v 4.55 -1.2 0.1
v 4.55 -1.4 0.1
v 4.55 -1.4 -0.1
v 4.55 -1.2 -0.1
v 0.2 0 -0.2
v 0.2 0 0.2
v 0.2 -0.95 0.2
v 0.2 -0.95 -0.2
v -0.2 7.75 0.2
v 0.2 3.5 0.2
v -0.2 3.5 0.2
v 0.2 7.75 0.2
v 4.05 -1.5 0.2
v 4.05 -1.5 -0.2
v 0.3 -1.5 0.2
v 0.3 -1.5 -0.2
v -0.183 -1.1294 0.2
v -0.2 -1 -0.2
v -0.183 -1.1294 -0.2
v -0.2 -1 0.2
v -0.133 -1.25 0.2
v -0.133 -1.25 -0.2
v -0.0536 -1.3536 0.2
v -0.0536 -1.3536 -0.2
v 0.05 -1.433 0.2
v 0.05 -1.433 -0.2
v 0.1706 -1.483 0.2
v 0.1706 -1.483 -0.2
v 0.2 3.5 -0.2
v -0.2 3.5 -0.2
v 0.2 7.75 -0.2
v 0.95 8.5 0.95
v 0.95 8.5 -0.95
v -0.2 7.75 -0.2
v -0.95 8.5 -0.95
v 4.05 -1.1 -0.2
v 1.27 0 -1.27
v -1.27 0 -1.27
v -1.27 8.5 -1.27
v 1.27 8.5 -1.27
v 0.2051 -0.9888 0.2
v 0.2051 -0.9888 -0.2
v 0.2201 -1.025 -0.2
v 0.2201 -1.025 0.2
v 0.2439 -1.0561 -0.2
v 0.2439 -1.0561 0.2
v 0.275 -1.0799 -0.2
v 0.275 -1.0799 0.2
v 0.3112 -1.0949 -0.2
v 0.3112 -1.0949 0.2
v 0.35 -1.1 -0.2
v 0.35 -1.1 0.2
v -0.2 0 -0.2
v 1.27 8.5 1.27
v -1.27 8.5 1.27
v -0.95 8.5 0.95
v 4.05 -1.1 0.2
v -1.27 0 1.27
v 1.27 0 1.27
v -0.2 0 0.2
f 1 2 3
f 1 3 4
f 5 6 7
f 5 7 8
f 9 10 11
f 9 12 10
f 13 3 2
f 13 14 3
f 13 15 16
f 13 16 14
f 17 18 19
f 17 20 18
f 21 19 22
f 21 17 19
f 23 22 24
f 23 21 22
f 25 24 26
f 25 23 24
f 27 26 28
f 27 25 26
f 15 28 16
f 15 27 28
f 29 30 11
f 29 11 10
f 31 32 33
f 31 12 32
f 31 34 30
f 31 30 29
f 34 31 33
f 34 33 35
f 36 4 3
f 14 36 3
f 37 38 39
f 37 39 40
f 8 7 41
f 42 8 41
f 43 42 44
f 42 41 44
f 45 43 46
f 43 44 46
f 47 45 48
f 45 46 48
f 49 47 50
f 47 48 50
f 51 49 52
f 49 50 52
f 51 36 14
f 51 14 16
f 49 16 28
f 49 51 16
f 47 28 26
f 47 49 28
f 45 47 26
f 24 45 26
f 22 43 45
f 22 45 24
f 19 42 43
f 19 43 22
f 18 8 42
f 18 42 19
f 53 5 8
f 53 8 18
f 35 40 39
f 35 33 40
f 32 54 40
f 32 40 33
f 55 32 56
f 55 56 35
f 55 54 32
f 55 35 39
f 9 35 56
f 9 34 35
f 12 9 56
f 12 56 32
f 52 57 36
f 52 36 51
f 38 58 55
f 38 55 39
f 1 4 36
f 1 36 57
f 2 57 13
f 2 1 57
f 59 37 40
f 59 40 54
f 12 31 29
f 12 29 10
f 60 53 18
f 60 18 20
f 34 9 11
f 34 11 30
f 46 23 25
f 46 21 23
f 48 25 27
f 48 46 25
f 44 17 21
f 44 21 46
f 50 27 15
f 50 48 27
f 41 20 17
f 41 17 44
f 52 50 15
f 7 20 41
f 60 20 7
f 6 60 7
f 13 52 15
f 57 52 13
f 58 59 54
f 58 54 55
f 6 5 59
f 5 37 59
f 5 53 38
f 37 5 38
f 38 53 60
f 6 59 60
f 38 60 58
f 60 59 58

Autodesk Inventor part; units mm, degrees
ref_plane "YZ Plane" through (0, 0, 0) normal (1, 0, 0) x (0, 1, 0)
ref_plane "XZ Plane" through (0, 0, 0) normal (0, 1, 0) x (-1, 0, 0)
ref_plane "XY Plane" through (0, 0, 0) normal (0, 0, 1) x (1, 0, 0)
sketch "Sketch1" plane through (0, 0, 0) normal (0, 1, 0) x (-1, 0, 0)
  line L0 (-1.27, 1.27) -> (1.27, 1.27)
  line L1 (1.27, 1.27) -> (1.27, -1.27)
  line L2 (1.27, -1.27) -> (-1.27, -1.27)
  line L3 (-1.27, -1.27) -> (-1.27, 1.27)
  line L4 (-1.27, 1.27) -> (1.27, -1.27) construction
  line L5 (1.27, 1.27) -> (-1.27, -1.27) construction
  point P0 (0, 0)
  dimension "d0" = 2.54
  dimension "d1" = 2.54
extrude "Extrusion1" add sketch "Sketch1" along normal blind 8.5
sketch "Sketch2" plane through (0, 8.5, 0) normal (0, 1, 0) x (1, 0, 0)
  line L0 (0.2, -0.2) -> (-0.2, -0.2)
  line L1 (-0.2, -0.2) -> (-0.2, 0.2)
  line L2 (-0.2, 0.2) -> (0.2, 0.2)
  line L3 (0.2, 0.2) -> (0.2, -0.2)
  line L4 (0.2, -0.2) -> (-0.2, 0.2) construction
  line L5 (-0.2, -0.2) -> (0.2, 0.2) construction
  point P0 (0, 0)
  dimension "d4" = 0.4
  dimension "d5" = 0.4
extrude "Extrusion2" cut sketch "Sketch2" against normal blind 5
chamfer "Chamfer1" distance 0.75 angle 45 4 edges at (0, 8.5, 0.2) (-0.2, 8.5, 0) (0, 8.5, -0.2) (0.2, 8.5, 0)
sketch "Sketch3" plane through (0, 0, 0) normal (0, -1, 0) x (1, 0, 0)
  line L0 (-0.2, 0.2) -> (0.2, 0.2)
  line L1 (0.2, 0.2) -> (0.2, -0.2)
  line L2 (0.2, -0.2) -> (-0.2, -0.2)
  line L3 (-0.2, -0.2) -> (-0.2, 0.2)
  line L4 (-0.2, 0.2) -> (0.2, -0.2) construction
  line L5 (0.2, 0.2) -> (-0.2, -0.2) construction
  point P0 (0, 0)
  dimension "d11" = 0.4
  dimension "d12" = 0.4
extrude "Extrusion3" add sketch "Sketch3" along normal blind 1.5
sketch "Sketch4" plane through (-0.2, 0, 0.2) normal (0, 0, 1) x (1, 0, 0)
  line L0 (0, -1.5) -> (4.75, -1.5)
  line L1 (4.75, -1.5) -> (4.75, -1.1)
  line L2 (4.75, -1.1) -> (0, -1.1)
  line L3 (0, -1.1) -> (0, -1.5)
  point P0 (0.2, 0)
  dimension "d27" = 0.4
  dimension "d28" = 4.75
extrude "Extrusion4" add sketch "Sketch4" against normal up to surface (0.4 mm away)
fillet "Fillet1" radius 0.5 1 edges at (-0.2, -1.5, 0)
fillet "Fillet2" radius 0.15 1 edges at (0.2, -1.1, 0)
chamfer "Chamfer6" distance 0.5 distance2 0.1 1 edges at (4.55, -1.3, 0.2) measured on face at (1.7333, -1.3667, 0.2)
chamfer "Chamfer7" distance 0.5 distance2 0.1 1 edges at (4.55, -1.1, -0.05) measured on face at (2.9833, -1.1, -0.0667)
chamfer "Chamfer8" distance 0.1 distance2 0.5 1 edges at (4.55, -1.35, -0.2) measured on face at (4.55, -1.4, 0)
chamfer "Chamfer9" distance 0.1 distance2 0.5 1 edges at (4.55, -1.5, 0) measured on face at (4.55, -1.4, 0.0333)
properties part number "FemaleHederPin_90"
